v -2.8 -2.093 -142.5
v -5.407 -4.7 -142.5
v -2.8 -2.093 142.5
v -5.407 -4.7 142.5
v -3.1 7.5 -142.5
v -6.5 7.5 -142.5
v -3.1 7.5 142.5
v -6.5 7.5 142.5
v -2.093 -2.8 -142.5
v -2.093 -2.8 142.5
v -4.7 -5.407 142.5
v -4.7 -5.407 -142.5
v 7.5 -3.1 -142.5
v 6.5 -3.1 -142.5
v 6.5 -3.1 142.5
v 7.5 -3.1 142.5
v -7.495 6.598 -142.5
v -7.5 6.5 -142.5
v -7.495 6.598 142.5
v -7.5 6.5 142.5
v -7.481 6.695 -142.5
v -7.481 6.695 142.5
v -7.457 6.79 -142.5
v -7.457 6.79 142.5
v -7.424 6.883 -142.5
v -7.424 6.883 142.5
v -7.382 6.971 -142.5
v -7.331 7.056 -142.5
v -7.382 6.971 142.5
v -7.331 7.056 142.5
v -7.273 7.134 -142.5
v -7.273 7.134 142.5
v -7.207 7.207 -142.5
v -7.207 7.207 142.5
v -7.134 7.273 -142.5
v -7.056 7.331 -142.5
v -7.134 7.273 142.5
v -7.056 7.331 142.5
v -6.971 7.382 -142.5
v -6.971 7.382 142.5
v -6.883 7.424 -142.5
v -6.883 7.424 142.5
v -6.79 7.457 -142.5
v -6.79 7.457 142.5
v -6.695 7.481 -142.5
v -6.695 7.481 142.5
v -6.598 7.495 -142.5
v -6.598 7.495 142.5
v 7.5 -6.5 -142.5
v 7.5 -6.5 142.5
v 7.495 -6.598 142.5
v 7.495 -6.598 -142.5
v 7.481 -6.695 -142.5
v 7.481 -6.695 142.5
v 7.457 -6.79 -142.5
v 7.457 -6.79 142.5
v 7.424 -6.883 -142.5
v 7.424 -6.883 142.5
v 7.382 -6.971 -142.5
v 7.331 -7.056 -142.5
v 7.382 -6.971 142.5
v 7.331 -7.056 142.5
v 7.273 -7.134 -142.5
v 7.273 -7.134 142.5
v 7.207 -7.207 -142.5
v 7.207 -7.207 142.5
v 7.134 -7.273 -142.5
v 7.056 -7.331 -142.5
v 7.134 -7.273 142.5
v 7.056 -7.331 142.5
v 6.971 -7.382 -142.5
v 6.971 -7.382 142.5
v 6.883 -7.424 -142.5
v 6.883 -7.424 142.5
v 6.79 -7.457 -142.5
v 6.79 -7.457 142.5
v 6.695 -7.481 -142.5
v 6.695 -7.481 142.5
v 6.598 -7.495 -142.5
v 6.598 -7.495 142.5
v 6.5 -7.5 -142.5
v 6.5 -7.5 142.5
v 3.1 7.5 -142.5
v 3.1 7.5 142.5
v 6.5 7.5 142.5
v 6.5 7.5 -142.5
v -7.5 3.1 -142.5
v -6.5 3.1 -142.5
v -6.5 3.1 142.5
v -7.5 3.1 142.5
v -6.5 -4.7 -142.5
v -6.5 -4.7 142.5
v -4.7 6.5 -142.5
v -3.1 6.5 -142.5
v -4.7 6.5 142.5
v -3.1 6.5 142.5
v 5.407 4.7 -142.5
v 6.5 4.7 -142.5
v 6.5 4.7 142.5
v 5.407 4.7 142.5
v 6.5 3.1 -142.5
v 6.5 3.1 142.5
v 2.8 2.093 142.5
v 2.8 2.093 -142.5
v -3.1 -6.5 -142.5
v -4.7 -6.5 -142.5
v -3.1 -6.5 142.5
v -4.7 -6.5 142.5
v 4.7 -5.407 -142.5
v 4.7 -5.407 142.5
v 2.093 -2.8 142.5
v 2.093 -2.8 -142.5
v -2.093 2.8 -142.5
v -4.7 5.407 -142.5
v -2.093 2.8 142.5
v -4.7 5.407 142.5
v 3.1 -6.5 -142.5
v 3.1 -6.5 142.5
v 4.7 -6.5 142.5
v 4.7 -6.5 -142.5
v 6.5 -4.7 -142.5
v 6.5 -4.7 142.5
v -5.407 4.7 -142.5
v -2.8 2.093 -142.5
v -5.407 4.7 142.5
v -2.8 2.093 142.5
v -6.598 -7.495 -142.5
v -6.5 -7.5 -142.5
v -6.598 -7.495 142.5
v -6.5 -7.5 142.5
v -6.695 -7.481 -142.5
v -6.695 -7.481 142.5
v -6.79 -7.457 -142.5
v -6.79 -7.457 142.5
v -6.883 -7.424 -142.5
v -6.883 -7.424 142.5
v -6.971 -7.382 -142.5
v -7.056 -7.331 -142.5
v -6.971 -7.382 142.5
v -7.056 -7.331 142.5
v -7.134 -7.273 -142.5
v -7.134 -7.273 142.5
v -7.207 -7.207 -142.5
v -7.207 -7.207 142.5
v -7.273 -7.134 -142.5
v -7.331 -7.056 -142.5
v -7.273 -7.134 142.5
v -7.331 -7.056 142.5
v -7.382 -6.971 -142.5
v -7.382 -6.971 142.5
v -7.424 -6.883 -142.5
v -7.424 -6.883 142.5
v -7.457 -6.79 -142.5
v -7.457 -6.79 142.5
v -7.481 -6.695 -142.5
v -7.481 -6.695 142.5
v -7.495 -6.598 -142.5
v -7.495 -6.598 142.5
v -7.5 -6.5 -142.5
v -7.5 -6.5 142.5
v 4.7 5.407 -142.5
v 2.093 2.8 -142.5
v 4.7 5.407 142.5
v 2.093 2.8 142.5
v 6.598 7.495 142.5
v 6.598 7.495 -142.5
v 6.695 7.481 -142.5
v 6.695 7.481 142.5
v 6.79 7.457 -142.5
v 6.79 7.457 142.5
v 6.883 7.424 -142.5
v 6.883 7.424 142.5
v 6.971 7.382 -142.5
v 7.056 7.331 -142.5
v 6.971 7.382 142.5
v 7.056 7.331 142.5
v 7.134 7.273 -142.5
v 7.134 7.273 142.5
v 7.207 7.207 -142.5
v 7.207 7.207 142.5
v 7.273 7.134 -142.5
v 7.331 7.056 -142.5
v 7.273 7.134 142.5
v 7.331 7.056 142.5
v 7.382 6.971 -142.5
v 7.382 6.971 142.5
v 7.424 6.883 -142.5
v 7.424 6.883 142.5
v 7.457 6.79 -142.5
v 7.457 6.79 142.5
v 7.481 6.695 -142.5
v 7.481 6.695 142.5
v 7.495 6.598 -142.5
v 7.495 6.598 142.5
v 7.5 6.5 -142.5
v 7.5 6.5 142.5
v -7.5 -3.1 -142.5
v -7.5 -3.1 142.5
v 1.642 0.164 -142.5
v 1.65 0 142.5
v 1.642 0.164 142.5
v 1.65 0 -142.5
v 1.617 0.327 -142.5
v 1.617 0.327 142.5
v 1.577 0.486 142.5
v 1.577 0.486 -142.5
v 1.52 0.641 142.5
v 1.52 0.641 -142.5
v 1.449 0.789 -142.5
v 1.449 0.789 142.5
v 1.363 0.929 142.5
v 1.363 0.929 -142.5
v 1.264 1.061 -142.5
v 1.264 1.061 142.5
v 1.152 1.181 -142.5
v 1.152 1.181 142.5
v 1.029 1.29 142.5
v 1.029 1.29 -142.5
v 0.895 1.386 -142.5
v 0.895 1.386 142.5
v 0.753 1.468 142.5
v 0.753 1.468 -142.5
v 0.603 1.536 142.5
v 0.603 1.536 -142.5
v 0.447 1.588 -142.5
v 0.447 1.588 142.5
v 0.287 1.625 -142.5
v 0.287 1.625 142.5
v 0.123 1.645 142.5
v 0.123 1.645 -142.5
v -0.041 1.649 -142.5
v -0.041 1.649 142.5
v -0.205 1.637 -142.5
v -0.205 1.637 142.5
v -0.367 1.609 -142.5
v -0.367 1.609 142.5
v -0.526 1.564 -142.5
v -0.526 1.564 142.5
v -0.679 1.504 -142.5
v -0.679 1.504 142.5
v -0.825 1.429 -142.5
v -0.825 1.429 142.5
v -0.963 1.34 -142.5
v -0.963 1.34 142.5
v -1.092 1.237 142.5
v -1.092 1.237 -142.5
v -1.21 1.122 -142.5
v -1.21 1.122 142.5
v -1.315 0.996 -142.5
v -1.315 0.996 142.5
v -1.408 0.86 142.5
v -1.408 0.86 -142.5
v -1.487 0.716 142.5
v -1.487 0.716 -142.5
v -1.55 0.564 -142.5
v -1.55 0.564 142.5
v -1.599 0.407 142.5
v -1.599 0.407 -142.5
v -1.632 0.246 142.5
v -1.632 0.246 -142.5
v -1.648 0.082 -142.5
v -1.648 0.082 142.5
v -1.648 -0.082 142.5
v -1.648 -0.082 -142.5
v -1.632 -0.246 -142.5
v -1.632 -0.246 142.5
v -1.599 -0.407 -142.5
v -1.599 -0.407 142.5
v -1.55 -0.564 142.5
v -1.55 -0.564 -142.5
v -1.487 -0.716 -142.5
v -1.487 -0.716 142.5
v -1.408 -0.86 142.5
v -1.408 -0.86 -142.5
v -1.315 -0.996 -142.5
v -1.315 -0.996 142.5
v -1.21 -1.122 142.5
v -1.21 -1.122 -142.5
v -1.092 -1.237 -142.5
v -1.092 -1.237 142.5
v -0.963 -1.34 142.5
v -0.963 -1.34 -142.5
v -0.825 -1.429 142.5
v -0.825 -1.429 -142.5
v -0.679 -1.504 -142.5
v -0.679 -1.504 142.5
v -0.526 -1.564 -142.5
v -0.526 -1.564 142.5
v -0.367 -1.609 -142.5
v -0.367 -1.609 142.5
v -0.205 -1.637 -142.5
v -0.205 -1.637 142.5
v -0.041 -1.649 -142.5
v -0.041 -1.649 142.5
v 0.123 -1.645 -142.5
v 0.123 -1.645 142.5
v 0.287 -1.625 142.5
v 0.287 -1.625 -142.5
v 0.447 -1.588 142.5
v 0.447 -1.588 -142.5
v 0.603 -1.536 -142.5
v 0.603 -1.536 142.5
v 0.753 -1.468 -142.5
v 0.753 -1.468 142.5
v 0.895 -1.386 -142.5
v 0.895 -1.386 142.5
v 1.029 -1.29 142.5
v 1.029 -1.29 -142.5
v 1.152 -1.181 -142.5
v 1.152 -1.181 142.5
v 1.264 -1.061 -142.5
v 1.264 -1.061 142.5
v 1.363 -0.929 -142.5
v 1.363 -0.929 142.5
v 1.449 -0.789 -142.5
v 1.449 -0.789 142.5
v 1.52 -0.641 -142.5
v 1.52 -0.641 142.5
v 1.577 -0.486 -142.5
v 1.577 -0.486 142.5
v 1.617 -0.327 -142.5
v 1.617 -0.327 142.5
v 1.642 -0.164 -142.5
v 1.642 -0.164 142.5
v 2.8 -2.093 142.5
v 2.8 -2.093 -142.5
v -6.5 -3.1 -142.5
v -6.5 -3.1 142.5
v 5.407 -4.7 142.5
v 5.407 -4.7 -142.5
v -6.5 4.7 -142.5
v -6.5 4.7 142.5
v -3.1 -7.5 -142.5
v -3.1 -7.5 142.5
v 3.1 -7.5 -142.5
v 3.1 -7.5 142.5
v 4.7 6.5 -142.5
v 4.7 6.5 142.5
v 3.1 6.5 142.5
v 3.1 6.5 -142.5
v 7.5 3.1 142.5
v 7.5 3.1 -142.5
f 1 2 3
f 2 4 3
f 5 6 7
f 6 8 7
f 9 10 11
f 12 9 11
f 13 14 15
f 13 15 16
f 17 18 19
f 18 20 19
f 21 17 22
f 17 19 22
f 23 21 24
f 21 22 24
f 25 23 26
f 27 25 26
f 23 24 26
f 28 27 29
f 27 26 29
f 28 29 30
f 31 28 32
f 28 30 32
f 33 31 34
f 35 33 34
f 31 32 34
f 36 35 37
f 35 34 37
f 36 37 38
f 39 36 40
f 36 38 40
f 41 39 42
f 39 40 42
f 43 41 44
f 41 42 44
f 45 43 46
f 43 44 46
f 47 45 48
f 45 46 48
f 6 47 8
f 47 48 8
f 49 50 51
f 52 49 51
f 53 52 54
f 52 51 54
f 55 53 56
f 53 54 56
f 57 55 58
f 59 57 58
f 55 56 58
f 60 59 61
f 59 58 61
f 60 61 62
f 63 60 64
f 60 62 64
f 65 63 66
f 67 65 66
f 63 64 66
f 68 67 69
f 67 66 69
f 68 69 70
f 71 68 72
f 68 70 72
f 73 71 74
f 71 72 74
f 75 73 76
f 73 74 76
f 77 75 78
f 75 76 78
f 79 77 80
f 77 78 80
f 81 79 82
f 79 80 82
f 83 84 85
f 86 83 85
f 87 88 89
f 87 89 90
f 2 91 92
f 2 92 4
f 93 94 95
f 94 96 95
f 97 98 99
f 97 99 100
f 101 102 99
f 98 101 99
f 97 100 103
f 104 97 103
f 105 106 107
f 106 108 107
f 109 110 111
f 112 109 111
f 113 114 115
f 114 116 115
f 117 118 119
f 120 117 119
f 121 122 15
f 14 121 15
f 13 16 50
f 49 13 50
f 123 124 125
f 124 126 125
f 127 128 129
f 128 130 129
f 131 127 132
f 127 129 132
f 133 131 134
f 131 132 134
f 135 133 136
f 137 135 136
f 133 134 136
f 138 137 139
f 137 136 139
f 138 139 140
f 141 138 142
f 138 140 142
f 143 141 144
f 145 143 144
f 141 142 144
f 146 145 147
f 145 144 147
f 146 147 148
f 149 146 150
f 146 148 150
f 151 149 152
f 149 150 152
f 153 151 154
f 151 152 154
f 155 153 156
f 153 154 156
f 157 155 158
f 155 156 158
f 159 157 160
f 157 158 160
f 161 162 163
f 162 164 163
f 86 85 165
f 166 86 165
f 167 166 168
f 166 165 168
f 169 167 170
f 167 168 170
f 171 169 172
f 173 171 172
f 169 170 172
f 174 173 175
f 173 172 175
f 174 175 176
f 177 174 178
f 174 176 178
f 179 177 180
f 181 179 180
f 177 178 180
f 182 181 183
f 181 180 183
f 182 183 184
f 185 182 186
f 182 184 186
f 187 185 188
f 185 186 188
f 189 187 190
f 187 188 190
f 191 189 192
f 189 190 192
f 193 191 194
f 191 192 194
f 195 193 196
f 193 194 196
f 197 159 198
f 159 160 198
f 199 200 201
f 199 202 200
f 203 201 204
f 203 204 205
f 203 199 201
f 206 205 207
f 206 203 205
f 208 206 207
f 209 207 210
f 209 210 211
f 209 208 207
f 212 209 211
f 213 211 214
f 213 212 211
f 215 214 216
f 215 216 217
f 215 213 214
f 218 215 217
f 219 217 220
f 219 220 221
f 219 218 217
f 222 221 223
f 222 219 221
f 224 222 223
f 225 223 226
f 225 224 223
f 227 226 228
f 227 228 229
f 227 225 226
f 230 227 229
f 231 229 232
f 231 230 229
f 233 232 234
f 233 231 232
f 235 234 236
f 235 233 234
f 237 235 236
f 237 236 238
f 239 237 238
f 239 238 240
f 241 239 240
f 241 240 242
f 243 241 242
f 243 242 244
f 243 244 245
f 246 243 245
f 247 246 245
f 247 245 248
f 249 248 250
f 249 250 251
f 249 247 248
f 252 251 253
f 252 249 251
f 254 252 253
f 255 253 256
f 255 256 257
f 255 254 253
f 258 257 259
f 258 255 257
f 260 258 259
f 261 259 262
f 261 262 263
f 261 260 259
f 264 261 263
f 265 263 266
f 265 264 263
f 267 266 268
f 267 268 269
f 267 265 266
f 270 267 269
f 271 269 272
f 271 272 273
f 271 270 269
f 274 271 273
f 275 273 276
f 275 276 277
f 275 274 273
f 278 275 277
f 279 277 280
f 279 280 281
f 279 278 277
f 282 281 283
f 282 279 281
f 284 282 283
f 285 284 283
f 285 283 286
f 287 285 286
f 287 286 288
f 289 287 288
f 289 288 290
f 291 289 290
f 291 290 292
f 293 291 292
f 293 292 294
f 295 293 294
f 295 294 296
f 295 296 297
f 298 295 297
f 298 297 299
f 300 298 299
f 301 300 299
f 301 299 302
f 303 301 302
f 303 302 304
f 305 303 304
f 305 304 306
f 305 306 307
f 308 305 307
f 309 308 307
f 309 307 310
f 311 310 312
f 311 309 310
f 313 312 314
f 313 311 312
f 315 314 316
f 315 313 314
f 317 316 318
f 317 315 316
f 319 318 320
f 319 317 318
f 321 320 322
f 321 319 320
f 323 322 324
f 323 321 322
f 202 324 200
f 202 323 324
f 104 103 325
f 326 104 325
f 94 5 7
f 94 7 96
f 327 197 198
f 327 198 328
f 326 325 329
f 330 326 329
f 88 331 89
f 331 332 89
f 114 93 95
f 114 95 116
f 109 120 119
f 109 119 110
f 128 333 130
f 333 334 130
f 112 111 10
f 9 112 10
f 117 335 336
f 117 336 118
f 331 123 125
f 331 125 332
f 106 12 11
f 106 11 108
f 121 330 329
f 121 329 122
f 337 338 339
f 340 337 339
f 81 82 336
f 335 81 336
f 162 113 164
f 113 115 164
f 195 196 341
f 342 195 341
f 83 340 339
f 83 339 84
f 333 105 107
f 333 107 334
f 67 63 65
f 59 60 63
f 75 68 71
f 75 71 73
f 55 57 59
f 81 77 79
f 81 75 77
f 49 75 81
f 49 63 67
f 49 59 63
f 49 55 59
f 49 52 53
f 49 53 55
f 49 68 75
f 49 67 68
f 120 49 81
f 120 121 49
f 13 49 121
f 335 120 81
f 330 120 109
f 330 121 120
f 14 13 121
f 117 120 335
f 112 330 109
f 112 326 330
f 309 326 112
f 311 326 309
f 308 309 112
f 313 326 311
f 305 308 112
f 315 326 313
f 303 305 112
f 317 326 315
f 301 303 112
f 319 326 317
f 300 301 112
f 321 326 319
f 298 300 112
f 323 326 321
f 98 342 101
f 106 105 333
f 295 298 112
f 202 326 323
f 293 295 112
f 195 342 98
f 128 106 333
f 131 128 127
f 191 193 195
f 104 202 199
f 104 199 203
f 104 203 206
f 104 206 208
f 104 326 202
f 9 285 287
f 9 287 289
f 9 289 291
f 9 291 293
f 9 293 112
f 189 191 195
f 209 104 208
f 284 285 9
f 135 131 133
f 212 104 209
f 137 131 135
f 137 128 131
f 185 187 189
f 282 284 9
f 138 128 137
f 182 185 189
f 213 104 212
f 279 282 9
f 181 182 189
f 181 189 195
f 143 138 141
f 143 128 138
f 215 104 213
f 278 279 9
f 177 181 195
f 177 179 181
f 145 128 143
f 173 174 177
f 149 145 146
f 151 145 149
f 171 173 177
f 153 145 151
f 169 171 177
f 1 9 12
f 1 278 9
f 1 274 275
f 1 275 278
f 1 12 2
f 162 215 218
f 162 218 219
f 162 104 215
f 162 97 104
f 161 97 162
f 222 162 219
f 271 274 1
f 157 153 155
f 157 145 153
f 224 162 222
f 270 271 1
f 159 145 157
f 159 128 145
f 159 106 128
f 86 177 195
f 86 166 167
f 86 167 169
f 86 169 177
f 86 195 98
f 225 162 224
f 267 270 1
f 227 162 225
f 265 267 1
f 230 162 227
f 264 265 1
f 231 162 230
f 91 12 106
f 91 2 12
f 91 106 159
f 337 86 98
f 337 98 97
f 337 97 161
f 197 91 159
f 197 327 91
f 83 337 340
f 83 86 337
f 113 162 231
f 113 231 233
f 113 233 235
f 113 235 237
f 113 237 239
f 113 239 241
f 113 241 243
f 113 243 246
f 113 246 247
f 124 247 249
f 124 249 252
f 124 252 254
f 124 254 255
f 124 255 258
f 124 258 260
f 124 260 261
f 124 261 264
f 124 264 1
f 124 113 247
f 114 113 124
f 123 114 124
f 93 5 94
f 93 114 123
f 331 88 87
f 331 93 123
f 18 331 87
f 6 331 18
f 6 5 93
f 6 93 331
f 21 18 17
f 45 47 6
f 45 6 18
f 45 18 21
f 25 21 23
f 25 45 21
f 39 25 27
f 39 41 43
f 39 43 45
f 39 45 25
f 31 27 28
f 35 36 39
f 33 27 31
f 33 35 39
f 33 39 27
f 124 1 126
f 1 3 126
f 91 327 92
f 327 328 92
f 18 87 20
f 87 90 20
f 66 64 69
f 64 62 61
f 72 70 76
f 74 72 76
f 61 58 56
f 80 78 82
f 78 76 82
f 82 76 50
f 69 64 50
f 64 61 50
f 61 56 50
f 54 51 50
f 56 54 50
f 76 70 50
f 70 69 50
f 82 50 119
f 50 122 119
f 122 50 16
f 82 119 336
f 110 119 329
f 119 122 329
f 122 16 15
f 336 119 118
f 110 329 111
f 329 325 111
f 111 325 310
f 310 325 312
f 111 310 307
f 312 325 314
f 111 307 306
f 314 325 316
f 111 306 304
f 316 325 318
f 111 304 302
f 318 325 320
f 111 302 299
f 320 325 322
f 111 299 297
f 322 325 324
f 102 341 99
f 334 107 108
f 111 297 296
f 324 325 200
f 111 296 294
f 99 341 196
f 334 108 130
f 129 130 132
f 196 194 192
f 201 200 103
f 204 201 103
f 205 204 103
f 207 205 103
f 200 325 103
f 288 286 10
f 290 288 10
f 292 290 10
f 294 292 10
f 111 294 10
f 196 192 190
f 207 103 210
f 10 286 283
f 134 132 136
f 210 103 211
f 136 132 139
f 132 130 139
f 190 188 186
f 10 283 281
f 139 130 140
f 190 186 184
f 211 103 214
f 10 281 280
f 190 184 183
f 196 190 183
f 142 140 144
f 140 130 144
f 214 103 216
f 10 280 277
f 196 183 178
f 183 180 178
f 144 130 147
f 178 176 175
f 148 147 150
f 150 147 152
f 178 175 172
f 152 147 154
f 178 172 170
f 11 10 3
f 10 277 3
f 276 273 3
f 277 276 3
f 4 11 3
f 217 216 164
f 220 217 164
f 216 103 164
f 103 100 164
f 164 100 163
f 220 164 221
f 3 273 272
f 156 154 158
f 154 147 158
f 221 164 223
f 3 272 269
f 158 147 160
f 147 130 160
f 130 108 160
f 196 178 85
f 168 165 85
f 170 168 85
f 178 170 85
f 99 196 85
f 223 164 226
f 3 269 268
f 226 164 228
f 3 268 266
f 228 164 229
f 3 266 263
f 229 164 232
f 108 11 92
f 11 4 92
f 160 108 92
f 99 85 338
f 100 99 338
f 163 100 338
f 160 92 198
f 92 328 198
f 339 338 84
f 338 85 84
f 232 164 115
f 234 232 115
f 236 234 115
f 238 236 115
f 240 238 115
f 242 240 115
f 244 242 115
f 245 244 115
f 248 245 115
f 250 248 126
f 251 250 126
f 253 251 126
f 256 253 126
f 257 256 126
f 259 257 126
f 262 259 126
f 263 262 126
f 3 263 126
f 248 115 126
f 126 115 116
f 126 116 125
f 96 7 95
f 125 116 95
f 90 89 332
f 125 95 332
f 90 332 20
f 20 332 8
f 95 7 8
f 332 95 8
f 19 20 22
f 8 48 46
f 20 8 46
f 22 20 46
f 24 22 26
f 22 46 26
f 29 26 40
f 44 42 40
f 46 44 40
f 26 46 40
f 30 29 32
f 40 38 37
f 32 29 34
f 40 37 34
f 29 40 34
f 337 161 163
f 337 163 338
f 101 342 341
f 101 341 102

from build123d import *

# Parameters (mm, degrees)
SKETCH_2_R      = 1.65
EXTRUDE_1_DEPTH = 142.5


with BuildPart() as part:
    # 草图2 → 凸台-拉伸1 (new, symmetric)
    with BuildSketch(Plane.XY):
        with BuildLine():
            Line((-2.092893219, -2.8), (-4.7, -5.407106781))
            Line((-4.7, -5.407106781), (-4.7, -6.5))
            Line((-4.7, -6.5), (-3.1, -6.5))
            Line((-3.1, -6.5), (-3.1, -7.5))
            Line((-3.1, -7.5), (-6.5, -7.5))
            ThreePointArc((-6.5, -7.5), (-7.207106781, -7.207106781), (-7.5, -6.5))
            Line((-7.5, -6.5), (-7.5, -3.1))
            Line((-7.5, -3.1), (-6.5, -3.1))
            Line((-6.5, -3.1), (-6.5, -4.7))
            Line((-6.5, -4.7), (-5.407106781, -4.7))
            Line((-5.407106781, -4.7), (-2.8, -2.092893219))
            Line((-2.8, -2.092893219), (-2.8, 2.092893219))
            Line((-2.8, 2.092893219), (-5.407106781, 4.7))
            Line((-5.407106781, 4.7), (-6.5, 4.7))
            Line((-6.5, 4.7), (-6.5, 3.1))
            Line((-6.5, 3.1), (-7.5, 3.1))
            Line((-7.5, 3.1), (-7.5, 6.5))
            ThreePointArc((-7.5, 6.5), (-7.207106781, 7.207106781), (-6.5, 7.5))
            Line((-6.5, 7.5), (-3.1, 7.5))
            Line((-3.1, 7.5), (-3.1, 6.5))
            Line((-3.1, 6.5), (-4.7, 6.5))
            Line((-4.7, 6.5), (-4.7, 5.407106781))
            Line((-4.7, 5.407106781), (-2.092893219, 2.8))
            Line((-2.092893219, 2.8), (2.092893219, 2.8))
            Line((2.092893219, 2.8), (4.7, 5.407106781))
            Line((4.7, 5.407106781), (4.7, 6.5))
            Line((4.7, 6.5), (3.1, 6.5))
            Line((3.1, 6.5), (3.1, 7.5))
            Line((3.1, 7.5), (6.5, 7.5))
            ThreePointArc((6.5, 7.5), (7.207106781, 7.207106781), (7.5, 6.5))
            Line((7.5, 6.5), (7.5, 3.1))
            Line((7.5, 3.1), (6.5, 3.1))
            Line((6.5, 3.1), (6.5, 4.7))
            Line((6.5, 4.7), (5.407106781, 4.7))
            Line((5.407106781, 4.7), (2.8, 2.092893219))
            Line((2.8, 2.092893219), (2.8, -2.092893219))
            Line((2.8, -2.092893219), (5.407106781, -4.7))
            Line((5.407106781, -4.7), (6.5, -4.7))
            Line((6.5, -4.7), (6.5, -3.1))
            Line((6.5, -3.1), (7.5, -3.1))
            Line((7.5, -3.1), (7.5, -6.5))
            ThreePointArc((7.5, -6.5), (7.207106781, -7.207106781), (6.5, -7.5))
            Line((6.5, -7.5), (3.1, -7.5))
            Line((3.1, -7.5), (3.1, -6.5))
            Line((3.1, -6.5), (4.7, -6.5))
            Line((4.7, -6.5), (4.7, -5.407106781))
            Line((4.7, -5.407106781), (2.092893219, -2.8))
            Line((2.092893219, -2.8), (-2.092893219, -2.8))
        make_face()
        Circle(SKETCH_2_R, mode=Mode.SUBTRACT)
    extrude(amount=EXTRUDE_1_DEPTH, both=True)


solid = part.part
